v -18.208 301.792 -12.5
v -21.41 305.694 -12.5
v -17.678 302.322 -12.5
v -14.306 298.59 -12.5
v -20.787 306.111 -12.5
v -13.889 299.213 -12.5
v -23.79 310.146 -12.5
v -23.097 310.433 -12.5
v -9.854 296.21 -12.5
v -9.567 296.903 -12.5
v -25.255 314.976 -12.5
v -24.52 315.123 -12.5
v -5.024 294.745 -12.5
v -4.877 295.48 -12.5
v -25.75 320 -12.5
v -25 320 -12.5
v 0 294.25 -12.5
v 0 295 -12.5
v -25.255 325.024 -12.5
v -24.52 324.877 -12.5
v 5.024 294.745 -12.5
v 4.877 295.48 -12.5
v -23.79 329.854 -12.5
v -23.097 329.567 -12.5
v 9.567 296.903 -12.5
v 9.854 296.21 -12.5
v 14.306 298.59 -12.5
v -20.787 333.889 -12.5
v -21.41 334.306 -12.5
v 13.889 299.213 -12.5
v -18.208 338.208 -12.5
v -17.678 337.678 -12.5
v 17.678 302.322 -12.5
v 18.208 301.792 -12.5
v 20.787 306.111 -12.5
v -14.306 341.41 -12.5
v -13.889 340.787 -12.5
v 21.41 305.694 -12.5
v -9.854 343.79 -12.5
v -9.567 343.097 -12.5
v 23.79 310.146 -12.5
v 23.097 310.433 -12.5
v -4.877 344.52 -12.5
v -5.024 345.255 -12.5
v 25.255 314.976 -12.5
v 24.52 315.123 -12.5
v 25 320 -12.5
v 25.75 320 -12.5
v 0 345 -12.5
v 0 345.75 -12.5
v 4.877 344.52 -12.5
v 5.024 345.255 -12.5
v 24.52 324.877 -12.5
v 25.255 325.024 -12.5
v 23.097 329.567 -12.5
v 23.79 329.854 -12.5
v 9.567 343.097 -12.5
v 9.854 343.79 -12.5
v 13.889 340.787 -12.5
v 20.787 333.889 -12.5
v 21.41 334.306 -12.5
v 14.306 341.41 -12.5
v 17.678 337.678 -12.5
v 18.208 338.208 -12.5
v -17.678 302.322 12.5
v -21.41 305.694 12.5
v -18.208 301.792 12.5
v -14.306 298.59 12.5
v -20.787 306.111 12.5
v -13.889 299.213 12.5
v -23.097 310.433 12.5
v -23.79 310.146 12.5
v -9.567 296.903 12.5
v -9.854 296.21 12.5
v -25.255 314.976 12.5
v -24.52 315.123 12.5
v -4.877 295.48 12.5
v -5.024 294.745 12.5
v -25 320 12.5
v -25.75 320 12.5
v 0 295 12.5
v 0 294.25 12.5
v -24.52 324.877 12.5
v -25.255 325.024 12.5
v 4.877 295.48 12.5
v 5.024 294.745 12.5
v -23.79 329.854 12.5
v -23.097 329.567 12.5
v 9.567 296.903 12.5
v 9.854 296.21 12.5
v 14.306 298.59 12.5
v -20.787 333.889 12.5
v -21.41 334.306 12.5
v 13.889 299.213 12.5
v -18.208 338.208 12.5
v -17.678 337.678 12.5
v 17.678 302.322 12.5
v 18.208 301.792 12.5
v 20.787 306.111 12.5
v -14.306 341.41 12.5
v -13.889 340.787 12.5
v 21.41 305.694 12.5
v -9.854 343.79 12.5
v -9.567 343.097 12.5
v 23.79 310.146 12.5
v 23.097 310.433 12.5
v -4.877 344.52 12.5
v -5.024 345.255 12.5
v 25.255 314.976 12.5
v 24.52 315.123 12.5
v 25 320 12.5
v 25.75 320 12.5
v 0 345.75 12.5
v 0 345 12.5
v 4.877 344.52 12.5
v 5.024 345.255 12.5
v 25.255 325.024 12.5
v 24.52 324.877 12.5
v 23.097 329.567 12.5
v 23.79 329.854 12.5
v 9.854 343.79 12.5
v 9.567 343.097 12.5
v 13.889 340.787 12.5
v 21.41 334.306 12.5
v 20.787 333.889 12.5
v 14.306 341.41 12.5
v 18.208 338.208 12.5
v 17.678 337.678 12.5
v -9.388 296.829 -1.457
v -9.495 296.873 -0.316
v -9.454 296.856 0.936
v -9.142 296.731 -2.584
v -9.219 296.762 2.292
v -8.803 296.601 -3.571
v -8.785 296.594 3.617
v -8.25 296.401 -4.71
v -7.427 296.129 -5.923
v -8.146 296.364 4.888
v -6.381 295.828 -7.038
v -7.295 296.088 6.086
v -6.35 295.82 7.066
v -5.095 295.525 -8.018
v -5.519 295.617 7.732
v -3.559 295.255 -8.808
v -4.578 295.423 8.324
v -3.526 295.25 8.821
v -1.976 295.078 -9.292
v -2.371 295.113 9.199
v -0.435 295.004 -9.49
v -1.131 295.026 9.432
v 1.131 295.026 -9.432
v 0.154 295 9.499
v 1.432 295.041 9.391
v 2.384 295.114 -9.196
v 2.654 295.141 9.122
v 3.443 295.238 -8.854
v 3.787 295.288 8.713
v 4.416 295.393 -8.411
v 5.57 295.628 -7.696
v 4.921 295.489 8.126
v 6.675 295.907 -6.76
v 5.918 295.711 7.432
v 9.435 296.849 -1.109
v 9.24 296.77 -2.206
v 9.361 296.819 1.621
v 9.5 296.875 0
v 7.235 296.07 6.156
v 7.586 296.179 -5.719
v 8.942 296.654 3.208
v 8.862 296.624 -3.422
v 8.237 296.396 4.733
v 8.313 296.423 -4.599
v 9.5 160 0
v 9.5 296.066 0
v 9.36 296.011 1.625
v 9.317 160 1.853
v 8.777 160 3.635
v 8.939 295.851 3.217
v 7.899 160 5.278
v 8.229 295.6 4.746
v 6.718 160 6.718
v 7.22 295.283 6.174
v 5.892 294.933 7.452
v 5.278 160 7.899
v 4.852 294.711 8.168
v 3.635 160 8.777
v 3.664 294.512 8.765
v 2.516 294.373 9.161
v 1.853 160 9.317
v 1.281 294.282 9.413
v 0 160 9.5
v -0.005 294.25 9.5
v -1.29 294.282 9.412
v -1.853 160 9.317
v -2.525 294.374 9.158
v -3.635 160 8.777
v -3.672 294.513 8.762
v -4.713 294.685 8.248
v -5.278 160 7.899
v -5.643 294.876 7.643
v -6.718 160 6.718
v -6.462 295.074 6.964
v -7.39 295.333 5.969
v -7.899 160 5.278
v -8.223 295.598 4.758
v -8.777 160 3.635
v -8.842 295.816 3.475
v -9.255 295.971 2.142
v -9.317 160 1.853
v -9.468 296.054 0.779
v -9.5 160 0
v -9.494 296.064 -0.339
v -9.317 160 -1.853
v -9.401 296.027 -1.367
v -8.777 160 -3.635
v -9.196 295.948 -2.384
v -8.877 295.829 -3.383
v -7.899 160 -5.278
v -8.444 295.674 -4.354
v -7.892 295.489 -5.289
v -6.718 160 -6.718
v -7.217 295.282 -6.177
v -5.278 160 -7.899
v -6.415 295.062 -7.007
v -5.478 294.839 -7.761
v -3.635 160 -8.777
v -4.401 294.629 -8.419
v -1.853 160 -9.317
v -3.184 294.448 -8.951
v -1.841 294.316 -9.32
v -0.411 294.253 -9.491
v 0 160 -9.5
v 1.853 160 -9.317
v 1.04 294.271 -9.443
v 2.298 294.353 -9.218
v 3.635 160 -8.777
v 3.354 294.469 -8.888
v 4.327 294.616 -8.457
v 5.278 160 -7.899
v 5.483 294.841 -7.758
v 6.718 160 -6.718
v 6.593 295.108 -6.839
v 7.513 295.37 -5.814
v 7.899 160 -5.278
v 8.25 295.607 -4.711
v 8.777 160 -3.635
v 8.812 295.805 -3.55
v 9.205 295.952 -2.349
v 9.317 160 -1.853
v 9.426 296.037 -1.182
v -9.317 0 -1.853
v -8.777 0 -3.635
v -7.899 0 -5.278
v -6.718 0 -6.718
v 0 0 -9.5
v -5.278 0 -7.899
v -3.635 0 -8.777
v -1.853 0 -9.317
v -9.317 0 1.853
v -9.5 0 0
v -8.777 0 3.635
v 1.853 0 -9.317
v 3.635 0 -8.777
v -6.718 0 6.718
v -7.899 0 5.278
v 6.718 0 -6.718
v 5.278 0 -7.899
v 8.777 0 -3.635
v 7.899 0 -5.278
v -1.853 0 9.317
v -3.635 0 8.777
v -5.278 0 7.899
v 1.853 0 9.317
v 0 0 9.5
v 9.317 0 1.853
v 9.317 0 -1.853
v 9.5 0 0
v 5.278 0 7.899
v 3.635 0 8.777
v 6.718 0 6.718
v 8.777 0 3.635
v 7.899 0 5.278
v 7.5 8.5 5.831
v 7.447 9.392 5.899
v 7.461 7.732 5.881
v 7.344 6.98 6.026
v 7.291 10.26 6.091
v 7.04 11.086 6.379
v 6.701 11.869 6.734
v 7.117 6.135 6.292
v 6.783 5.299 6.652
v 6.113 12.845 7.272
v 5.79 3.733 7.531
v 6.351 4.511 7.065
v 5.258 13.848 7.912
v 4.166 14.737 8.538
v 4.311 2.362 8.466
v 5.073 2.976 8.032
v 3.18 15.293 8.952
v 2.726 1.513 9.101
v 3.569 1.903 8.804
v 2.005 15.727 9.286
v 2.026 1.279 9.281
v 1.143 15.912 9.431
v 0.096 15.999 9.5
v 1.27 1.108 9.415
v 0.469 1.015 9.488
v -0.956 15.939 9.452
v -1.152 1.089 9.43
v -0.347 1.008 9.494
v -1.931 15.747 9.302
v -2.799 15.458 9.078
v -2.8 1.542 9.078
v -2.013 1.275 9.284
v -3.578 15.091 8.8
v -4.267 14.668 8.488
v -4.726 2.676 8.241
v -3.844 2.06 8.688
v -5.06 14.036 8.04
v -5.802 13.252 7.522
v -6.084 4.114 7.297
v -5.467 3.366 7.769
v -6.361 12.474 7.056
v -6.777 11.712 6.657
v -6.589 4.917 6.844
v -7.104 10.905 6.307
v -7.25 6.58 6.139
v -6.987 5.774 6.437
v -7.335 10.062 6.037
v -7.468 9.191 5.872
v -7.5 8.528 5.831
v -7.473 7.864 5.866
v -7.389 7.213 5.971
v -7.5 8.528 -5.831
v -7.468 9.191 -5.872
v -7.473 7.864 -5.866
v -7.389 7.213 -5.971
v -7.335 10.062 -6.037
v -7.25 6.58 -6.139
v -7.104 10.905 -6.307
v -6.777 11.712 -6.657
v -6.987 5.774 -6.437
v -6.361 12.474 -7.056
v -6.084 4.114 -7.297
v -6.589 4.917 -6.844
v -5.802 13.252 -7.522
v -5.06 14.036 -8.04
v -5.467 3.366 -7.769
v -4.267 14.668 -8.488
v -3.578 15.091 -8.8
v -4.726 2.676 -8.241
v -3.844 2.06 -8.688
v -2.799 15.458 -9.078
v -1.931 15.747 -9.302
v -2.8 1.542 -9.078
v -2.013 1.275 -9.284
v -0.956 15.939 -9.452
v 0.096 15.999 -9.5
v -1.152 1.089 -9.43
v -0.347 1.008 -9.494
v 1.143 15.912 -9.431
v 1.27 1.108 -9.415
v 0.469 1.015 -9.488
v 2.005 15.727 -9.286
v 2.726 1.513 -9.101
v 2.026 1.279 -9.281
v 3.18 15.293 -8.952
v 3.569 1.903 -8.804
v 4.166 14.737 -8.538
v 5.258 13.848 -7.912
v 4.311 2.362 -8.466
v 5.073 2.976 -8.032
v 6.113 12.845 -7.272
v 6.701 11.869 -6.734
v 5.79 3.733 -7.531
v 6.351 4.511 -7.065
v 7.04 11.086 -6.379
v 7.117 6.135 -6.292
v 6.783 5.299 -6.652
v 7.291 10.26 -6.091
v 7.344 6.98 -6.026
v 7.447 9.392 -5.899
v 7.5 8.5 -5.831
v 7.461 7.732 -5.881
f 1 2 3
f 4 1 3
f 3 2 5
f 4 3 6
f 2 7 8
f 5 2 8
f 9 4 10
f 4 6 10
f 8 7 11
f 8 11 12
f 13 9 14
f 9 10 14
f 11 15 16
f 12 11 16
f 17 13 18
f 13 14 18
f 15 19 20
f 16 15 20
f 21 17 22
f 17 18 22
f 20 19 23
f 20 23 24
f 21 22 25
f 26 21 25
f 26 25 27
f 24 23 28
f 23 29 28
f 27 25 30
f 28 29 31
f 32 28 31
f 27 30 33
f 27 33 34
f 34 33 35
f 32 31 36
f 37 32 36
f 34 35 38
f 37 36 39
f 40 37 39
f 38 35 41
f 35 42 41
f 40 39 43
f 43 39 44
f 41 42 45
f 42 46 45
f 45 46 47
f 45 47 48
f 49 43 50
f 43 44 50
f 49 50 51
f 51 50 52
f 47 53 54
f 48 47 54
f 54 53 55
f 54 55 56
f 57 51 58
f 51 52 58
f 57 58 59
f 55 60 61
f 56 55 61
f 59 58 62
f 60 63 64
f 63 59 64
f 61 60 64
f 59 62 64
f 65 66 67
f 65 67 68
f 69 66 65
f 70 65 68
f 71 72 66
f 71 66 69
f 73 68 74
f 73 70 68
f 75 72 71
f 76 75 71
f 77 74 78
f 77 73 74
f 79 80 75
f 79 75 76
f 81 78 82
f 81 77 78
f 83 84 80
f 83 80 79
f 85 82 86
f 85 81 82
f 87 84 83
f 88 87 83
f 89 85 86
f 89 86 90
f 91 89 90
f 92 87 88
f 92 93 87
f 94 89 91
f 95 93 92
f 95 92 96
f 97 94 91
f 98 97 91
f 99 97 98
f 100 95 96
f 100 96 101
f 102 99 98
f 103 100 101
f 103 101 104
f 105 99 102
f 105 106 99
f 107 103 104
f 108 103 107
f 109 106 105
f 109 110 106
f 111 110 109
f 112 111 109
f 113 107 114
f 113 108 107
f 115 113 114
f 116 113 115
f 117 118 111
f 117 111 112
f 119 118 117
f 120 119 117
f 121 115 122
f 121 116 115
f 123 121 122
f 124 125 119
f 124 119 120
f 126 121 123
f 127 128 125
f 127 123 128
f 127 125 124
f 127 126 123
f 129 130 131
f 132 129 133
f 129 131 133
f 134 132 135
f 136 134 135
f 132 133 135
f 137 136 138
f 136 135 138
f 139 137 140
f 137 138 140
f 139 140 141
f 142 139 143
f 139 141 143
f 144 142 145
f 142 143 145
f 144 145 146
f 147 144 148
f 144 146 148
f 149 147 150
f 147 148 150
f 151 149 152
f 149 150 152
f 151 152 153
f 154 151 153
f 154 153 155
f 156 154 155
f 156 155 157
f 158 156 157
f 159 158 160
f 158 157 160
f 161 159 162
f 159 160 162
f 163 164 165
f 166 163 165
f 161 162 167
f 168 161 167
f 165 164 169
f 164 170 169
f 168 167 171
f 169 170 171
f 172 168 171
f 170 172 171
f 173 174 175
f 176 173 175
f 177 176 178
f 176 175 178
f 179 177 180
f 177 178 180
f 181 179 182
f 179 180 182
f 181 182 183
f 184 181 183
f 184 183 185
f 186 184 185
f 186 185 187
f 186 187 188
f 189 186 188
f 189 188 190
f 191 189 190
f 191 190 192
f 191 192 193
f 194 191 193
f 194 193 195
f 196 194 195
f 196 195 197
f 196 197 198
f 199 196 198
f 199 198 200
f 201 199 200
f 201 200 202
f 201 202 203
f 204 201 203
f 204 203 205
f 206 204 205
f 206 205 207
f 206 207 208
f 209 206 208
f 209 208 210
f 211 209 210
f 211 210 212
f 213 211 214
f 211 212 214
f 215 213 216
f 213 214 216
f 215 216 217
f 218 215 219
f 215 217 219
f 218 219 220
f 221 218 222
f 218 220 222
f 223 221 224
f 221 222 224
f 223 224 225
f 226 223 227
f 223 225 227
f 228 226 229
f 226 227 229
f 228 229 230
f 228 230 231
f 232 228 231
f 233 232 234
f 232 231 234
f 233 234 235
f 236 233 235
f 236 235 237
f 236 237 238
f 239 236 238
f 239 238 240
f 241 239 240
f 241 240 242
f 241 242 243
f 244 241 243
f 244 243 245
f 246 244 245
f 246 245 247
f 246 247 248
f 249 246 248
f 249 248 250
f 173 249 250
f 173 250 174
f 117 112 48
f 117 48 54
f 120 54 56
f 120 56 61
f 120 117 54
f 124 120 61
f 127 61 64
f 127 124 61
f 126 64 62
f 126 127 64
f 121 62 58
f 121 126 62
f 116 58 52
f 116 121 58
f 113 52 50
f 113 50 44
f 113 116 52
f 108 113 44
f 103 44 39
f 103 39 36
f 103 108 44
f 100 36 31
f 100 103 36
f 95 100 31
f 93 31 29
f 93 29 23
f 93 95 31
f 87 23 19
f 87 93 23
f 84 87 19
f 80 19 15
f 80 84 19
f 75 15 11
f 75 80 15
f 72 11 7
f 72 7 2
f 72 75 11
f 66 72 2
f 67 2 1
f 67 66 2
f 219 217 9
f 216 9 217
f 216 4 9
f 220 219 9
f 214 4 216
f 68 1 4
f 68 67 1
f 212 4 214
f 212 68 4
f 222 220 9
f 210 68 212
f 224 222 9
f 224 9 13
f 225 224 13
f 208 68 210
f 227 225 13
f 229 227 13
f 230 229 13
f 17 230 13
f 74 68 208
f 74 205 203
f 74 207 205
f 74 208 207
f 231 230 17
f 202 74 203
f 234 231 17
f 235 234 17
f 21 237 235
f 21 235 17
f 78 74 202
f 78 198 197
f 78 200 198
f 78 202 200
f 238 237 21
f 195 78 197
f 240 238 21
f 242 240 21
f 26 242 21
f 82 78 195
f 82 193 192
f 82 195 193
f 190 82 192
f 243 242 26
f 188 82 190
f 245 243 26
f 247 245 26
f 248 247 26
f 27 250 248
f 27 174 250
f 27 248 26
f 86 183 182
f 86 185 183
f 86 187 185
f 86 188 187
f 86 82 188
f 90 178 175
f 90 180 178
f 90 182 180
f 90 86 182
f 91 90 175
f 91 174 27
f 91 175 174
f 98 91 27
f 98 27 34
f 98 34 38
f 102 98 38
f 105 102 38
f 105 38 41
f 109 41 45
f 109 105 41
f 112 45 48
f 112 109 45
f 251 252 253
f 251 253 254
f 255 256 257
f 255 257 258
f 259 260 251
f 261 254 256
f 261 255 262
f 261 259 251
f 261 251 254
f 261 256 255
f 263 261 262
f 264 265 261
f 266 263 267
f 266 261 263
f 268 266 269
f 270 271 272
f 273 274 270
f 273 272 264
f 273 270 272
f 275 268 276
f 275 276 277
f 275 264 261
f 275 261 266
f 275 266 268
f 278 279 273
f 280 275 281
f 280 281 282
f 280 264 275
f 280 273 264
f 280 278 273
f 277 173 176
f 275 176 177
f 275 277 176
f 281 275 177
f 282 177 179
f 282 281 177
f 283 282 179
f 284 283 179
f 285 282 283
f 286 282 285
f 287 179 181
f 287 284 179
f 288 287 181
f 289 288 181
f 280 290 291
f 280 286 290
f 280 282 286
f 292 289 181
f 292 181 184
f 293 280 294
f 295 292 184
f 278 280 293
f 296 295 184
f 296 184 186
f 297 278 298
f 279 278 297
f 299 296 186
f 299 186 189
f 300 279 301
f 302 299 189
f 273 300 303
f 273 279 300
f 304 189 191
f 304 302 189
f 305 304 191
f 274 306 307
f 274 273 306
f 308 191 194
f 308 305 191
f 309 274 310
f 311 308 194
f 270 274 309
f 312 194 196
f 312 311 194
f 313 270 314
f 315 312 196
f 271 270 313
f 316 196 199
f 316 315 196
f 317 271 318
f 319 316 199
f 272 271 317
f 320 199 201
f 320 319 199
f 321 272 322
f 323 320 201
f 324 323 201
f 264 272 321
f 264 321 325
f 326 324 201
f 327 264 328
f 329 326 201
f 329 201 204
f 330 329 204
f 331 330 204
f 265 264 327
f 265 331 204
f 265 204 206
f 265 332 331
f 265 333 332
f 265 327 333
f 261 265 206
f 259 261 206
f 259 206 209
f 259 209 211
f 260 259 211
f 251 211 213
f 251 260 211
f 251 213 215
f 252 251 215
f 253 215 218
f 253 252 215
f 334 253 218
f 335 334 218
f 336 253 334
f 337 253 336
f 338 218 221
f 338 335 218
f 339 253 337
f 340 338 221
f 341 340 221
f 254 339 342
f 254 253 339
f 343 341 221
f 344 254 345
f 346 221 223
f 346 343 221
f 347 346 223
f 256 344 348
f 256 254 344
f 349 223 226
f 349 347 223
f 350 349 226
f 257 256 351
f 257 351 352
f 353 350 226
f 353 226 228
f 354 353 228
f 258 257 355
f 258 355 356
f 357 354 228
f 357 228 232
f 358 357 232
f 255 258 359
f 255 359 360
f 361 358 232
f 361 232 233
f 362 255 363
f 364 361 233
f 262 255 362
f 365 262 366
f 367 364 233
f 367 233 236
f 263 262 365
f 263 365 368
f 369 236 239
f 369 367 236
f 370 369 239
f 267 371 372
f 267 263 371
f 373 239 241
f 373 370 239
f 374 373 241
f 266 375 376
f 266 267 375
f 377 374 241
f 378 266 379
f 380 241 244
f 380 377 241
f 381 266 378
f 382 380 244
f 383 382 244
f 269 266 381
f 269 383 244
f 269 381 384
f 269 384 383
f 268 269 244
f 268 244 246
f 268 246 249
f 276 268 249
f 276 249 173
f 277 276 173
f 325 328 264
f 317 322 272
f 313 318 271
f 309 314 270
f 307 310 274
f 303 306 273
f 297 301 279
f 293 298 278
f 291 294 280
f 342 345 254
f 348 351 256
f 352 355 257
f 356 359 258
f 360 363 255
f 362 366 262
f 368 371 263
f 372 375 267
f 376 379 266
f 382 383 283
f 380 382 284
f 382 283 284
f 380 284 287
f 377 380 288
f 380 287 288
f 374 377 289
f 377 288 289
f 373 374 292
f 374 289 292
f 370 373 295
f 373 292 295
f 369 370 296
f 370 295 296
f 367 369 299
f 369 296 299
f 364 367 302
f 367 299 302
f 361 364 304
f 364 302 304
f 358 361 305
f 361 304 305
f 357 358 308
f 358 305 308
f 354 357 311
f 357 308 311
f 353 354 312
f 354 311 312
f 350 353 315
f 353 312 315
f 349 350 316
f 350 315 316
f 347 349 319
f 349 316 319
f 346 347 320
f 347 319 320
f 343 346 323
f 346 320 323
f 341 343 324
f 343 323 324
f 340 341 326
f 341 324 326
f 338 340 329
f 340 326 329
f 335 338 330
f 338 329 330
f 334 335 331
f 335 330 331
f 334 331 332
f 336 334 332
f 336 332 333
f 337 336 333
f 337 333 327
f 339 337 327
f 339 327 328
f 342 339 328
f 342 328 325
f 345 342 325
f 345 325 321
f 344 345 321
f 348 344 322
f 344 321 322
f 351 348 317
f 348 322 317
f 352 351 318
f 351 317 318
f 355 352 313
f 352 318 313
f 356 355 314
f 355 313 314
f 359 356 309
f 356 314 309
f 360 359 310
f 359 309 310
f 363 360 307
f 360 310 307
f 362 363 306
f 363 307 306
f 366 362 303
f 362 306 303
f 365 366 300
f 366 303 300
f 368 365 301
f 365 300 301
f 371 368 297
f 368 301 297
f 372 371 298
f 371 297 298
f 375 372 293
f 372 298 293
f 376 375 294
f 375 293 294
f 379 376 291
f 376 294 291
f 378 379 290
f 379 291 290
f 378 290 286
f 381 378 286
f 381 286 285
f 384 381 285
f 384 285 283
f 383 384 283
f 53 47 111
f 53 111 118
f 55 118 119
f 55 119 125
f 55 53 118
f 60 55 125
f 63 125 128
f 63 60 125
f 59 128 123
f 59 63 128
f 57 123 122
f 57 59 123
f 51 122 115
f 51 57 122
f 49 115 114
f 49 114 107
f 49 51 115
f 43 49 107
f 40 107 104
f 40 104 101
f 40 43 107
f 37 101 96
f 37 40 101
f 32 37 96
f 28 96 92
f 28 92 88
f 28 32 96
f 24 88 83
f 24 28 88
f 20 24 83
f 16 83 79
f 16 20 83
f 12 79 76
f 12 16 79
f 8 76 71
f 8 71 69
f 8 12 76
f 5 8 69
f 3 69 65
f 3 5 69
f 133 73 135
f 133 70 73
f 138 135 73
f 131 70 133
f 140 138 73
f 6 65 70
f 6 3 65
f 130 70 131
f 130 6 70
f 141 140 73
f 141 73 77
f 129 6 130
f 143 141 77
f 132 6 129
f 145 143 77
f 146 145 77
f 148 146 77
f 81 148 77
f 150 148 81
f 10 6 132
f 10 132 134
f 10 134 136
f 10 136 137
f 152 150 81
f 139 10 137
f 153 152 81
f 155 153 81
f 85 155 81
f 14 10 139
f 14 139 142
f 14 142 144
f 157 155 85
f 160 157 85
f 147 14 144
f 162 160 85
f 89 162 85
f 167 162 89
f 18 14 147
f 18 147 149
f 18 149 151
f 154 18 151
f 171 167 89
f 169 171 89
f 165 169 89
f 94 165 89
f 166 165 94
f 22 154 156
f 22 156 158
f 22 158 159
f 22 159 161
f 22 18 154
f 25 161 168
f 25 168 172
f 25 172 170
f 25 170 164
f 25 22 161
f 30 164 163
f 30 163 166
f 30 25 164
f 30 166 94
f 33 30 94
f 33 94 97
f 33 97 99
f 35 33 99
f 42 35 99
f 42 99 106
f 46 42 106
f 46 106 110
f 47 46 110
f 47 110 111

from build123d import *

# Parameters (mm, degrees)
F0_R     = 9.5
F1_DEPTH = 160
F2_W     = 37.5
F2_H     = 20
F3_DEPTH = 30
F4_R     = 7.5
F5_DEPTH = 1000
F7_R     = 25.75
F7_R_2   = 25
F8_DEPTH = 12.5
F9_DEPTH = 500


with BuildPart() as f1:
    # F0 (on Front) → F1 (new body)
    with BuildSketch(Plane.XZ):
        Circle(F0_R)
    extrude(amount=-F1_DEPTH)

    # F2 (on Front) → F3 (cut)
    with BuildSketch(Plane.XZ):
        Rectangle(F2_W, F2_H)
    extrude(amount=F3_DEPTH, mode=Mode.SUBTRACT)

    # F4 (on Top) → F5 (cut, symmetric)
    with BuildSketch(Plane.XY):
        with Locations((0, 8.5)):
            Circle(F4_R)
    extrude(amount=F5_DEPTH, both=True, mode=Mode.SUBTRACT)

    # F6: F1 across face


with BuildPart() as f1_1:
    add(f1.part)
    add(f1.part.mirror(Plane(origin=(0, 160, 0), x_dir=(1, 0, 0), z_dir=(0, 1, 0))))

    # F7 (on Top) → F8 (join, symmetric)
    with BuildSketch(Plane.XY):
        with Locations((0, 320)):
            Circle(F7_R)
        with Locations((0, 320)):
            Circle(F7_R_2, mode=Mode.SUBTRACT)
    extrude(amount=F8_DEPTH, both=True)

    # F7 (on Top) → F9 (cut, symmetric)
    with BuildSketch(Plane.XY):
        with Locations((0, 320)):
            Circle(F7_R_2)
    extrude(amount=F9_DEPTH, both=True, mode=Mode.SUBTRACT)


solid = f1_1.part
